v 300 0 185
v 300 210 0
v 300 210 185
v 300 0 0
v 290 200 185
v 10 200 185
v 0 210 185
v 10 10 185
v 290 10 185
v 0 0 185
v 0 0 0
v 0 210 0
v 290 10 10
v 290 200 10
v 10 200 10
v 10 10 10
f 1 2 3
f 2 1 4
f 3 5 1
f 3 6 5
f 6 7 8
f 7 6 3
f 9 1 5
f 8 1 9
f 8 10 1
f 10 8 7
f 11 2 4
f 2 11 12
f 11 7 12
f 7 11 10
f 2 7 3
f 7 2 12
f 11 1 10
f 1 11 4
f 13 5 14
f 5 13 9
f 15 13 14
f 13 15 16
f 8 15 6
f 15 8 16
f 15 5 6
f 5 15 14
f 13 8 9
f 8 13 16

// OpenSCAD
W=300;D=210;H=185;wall=10;difference(){cube([W,D,H]);translate([wall,wall,wall])cube([W-2*wall,D-2*wall,H-wall+1]);}
